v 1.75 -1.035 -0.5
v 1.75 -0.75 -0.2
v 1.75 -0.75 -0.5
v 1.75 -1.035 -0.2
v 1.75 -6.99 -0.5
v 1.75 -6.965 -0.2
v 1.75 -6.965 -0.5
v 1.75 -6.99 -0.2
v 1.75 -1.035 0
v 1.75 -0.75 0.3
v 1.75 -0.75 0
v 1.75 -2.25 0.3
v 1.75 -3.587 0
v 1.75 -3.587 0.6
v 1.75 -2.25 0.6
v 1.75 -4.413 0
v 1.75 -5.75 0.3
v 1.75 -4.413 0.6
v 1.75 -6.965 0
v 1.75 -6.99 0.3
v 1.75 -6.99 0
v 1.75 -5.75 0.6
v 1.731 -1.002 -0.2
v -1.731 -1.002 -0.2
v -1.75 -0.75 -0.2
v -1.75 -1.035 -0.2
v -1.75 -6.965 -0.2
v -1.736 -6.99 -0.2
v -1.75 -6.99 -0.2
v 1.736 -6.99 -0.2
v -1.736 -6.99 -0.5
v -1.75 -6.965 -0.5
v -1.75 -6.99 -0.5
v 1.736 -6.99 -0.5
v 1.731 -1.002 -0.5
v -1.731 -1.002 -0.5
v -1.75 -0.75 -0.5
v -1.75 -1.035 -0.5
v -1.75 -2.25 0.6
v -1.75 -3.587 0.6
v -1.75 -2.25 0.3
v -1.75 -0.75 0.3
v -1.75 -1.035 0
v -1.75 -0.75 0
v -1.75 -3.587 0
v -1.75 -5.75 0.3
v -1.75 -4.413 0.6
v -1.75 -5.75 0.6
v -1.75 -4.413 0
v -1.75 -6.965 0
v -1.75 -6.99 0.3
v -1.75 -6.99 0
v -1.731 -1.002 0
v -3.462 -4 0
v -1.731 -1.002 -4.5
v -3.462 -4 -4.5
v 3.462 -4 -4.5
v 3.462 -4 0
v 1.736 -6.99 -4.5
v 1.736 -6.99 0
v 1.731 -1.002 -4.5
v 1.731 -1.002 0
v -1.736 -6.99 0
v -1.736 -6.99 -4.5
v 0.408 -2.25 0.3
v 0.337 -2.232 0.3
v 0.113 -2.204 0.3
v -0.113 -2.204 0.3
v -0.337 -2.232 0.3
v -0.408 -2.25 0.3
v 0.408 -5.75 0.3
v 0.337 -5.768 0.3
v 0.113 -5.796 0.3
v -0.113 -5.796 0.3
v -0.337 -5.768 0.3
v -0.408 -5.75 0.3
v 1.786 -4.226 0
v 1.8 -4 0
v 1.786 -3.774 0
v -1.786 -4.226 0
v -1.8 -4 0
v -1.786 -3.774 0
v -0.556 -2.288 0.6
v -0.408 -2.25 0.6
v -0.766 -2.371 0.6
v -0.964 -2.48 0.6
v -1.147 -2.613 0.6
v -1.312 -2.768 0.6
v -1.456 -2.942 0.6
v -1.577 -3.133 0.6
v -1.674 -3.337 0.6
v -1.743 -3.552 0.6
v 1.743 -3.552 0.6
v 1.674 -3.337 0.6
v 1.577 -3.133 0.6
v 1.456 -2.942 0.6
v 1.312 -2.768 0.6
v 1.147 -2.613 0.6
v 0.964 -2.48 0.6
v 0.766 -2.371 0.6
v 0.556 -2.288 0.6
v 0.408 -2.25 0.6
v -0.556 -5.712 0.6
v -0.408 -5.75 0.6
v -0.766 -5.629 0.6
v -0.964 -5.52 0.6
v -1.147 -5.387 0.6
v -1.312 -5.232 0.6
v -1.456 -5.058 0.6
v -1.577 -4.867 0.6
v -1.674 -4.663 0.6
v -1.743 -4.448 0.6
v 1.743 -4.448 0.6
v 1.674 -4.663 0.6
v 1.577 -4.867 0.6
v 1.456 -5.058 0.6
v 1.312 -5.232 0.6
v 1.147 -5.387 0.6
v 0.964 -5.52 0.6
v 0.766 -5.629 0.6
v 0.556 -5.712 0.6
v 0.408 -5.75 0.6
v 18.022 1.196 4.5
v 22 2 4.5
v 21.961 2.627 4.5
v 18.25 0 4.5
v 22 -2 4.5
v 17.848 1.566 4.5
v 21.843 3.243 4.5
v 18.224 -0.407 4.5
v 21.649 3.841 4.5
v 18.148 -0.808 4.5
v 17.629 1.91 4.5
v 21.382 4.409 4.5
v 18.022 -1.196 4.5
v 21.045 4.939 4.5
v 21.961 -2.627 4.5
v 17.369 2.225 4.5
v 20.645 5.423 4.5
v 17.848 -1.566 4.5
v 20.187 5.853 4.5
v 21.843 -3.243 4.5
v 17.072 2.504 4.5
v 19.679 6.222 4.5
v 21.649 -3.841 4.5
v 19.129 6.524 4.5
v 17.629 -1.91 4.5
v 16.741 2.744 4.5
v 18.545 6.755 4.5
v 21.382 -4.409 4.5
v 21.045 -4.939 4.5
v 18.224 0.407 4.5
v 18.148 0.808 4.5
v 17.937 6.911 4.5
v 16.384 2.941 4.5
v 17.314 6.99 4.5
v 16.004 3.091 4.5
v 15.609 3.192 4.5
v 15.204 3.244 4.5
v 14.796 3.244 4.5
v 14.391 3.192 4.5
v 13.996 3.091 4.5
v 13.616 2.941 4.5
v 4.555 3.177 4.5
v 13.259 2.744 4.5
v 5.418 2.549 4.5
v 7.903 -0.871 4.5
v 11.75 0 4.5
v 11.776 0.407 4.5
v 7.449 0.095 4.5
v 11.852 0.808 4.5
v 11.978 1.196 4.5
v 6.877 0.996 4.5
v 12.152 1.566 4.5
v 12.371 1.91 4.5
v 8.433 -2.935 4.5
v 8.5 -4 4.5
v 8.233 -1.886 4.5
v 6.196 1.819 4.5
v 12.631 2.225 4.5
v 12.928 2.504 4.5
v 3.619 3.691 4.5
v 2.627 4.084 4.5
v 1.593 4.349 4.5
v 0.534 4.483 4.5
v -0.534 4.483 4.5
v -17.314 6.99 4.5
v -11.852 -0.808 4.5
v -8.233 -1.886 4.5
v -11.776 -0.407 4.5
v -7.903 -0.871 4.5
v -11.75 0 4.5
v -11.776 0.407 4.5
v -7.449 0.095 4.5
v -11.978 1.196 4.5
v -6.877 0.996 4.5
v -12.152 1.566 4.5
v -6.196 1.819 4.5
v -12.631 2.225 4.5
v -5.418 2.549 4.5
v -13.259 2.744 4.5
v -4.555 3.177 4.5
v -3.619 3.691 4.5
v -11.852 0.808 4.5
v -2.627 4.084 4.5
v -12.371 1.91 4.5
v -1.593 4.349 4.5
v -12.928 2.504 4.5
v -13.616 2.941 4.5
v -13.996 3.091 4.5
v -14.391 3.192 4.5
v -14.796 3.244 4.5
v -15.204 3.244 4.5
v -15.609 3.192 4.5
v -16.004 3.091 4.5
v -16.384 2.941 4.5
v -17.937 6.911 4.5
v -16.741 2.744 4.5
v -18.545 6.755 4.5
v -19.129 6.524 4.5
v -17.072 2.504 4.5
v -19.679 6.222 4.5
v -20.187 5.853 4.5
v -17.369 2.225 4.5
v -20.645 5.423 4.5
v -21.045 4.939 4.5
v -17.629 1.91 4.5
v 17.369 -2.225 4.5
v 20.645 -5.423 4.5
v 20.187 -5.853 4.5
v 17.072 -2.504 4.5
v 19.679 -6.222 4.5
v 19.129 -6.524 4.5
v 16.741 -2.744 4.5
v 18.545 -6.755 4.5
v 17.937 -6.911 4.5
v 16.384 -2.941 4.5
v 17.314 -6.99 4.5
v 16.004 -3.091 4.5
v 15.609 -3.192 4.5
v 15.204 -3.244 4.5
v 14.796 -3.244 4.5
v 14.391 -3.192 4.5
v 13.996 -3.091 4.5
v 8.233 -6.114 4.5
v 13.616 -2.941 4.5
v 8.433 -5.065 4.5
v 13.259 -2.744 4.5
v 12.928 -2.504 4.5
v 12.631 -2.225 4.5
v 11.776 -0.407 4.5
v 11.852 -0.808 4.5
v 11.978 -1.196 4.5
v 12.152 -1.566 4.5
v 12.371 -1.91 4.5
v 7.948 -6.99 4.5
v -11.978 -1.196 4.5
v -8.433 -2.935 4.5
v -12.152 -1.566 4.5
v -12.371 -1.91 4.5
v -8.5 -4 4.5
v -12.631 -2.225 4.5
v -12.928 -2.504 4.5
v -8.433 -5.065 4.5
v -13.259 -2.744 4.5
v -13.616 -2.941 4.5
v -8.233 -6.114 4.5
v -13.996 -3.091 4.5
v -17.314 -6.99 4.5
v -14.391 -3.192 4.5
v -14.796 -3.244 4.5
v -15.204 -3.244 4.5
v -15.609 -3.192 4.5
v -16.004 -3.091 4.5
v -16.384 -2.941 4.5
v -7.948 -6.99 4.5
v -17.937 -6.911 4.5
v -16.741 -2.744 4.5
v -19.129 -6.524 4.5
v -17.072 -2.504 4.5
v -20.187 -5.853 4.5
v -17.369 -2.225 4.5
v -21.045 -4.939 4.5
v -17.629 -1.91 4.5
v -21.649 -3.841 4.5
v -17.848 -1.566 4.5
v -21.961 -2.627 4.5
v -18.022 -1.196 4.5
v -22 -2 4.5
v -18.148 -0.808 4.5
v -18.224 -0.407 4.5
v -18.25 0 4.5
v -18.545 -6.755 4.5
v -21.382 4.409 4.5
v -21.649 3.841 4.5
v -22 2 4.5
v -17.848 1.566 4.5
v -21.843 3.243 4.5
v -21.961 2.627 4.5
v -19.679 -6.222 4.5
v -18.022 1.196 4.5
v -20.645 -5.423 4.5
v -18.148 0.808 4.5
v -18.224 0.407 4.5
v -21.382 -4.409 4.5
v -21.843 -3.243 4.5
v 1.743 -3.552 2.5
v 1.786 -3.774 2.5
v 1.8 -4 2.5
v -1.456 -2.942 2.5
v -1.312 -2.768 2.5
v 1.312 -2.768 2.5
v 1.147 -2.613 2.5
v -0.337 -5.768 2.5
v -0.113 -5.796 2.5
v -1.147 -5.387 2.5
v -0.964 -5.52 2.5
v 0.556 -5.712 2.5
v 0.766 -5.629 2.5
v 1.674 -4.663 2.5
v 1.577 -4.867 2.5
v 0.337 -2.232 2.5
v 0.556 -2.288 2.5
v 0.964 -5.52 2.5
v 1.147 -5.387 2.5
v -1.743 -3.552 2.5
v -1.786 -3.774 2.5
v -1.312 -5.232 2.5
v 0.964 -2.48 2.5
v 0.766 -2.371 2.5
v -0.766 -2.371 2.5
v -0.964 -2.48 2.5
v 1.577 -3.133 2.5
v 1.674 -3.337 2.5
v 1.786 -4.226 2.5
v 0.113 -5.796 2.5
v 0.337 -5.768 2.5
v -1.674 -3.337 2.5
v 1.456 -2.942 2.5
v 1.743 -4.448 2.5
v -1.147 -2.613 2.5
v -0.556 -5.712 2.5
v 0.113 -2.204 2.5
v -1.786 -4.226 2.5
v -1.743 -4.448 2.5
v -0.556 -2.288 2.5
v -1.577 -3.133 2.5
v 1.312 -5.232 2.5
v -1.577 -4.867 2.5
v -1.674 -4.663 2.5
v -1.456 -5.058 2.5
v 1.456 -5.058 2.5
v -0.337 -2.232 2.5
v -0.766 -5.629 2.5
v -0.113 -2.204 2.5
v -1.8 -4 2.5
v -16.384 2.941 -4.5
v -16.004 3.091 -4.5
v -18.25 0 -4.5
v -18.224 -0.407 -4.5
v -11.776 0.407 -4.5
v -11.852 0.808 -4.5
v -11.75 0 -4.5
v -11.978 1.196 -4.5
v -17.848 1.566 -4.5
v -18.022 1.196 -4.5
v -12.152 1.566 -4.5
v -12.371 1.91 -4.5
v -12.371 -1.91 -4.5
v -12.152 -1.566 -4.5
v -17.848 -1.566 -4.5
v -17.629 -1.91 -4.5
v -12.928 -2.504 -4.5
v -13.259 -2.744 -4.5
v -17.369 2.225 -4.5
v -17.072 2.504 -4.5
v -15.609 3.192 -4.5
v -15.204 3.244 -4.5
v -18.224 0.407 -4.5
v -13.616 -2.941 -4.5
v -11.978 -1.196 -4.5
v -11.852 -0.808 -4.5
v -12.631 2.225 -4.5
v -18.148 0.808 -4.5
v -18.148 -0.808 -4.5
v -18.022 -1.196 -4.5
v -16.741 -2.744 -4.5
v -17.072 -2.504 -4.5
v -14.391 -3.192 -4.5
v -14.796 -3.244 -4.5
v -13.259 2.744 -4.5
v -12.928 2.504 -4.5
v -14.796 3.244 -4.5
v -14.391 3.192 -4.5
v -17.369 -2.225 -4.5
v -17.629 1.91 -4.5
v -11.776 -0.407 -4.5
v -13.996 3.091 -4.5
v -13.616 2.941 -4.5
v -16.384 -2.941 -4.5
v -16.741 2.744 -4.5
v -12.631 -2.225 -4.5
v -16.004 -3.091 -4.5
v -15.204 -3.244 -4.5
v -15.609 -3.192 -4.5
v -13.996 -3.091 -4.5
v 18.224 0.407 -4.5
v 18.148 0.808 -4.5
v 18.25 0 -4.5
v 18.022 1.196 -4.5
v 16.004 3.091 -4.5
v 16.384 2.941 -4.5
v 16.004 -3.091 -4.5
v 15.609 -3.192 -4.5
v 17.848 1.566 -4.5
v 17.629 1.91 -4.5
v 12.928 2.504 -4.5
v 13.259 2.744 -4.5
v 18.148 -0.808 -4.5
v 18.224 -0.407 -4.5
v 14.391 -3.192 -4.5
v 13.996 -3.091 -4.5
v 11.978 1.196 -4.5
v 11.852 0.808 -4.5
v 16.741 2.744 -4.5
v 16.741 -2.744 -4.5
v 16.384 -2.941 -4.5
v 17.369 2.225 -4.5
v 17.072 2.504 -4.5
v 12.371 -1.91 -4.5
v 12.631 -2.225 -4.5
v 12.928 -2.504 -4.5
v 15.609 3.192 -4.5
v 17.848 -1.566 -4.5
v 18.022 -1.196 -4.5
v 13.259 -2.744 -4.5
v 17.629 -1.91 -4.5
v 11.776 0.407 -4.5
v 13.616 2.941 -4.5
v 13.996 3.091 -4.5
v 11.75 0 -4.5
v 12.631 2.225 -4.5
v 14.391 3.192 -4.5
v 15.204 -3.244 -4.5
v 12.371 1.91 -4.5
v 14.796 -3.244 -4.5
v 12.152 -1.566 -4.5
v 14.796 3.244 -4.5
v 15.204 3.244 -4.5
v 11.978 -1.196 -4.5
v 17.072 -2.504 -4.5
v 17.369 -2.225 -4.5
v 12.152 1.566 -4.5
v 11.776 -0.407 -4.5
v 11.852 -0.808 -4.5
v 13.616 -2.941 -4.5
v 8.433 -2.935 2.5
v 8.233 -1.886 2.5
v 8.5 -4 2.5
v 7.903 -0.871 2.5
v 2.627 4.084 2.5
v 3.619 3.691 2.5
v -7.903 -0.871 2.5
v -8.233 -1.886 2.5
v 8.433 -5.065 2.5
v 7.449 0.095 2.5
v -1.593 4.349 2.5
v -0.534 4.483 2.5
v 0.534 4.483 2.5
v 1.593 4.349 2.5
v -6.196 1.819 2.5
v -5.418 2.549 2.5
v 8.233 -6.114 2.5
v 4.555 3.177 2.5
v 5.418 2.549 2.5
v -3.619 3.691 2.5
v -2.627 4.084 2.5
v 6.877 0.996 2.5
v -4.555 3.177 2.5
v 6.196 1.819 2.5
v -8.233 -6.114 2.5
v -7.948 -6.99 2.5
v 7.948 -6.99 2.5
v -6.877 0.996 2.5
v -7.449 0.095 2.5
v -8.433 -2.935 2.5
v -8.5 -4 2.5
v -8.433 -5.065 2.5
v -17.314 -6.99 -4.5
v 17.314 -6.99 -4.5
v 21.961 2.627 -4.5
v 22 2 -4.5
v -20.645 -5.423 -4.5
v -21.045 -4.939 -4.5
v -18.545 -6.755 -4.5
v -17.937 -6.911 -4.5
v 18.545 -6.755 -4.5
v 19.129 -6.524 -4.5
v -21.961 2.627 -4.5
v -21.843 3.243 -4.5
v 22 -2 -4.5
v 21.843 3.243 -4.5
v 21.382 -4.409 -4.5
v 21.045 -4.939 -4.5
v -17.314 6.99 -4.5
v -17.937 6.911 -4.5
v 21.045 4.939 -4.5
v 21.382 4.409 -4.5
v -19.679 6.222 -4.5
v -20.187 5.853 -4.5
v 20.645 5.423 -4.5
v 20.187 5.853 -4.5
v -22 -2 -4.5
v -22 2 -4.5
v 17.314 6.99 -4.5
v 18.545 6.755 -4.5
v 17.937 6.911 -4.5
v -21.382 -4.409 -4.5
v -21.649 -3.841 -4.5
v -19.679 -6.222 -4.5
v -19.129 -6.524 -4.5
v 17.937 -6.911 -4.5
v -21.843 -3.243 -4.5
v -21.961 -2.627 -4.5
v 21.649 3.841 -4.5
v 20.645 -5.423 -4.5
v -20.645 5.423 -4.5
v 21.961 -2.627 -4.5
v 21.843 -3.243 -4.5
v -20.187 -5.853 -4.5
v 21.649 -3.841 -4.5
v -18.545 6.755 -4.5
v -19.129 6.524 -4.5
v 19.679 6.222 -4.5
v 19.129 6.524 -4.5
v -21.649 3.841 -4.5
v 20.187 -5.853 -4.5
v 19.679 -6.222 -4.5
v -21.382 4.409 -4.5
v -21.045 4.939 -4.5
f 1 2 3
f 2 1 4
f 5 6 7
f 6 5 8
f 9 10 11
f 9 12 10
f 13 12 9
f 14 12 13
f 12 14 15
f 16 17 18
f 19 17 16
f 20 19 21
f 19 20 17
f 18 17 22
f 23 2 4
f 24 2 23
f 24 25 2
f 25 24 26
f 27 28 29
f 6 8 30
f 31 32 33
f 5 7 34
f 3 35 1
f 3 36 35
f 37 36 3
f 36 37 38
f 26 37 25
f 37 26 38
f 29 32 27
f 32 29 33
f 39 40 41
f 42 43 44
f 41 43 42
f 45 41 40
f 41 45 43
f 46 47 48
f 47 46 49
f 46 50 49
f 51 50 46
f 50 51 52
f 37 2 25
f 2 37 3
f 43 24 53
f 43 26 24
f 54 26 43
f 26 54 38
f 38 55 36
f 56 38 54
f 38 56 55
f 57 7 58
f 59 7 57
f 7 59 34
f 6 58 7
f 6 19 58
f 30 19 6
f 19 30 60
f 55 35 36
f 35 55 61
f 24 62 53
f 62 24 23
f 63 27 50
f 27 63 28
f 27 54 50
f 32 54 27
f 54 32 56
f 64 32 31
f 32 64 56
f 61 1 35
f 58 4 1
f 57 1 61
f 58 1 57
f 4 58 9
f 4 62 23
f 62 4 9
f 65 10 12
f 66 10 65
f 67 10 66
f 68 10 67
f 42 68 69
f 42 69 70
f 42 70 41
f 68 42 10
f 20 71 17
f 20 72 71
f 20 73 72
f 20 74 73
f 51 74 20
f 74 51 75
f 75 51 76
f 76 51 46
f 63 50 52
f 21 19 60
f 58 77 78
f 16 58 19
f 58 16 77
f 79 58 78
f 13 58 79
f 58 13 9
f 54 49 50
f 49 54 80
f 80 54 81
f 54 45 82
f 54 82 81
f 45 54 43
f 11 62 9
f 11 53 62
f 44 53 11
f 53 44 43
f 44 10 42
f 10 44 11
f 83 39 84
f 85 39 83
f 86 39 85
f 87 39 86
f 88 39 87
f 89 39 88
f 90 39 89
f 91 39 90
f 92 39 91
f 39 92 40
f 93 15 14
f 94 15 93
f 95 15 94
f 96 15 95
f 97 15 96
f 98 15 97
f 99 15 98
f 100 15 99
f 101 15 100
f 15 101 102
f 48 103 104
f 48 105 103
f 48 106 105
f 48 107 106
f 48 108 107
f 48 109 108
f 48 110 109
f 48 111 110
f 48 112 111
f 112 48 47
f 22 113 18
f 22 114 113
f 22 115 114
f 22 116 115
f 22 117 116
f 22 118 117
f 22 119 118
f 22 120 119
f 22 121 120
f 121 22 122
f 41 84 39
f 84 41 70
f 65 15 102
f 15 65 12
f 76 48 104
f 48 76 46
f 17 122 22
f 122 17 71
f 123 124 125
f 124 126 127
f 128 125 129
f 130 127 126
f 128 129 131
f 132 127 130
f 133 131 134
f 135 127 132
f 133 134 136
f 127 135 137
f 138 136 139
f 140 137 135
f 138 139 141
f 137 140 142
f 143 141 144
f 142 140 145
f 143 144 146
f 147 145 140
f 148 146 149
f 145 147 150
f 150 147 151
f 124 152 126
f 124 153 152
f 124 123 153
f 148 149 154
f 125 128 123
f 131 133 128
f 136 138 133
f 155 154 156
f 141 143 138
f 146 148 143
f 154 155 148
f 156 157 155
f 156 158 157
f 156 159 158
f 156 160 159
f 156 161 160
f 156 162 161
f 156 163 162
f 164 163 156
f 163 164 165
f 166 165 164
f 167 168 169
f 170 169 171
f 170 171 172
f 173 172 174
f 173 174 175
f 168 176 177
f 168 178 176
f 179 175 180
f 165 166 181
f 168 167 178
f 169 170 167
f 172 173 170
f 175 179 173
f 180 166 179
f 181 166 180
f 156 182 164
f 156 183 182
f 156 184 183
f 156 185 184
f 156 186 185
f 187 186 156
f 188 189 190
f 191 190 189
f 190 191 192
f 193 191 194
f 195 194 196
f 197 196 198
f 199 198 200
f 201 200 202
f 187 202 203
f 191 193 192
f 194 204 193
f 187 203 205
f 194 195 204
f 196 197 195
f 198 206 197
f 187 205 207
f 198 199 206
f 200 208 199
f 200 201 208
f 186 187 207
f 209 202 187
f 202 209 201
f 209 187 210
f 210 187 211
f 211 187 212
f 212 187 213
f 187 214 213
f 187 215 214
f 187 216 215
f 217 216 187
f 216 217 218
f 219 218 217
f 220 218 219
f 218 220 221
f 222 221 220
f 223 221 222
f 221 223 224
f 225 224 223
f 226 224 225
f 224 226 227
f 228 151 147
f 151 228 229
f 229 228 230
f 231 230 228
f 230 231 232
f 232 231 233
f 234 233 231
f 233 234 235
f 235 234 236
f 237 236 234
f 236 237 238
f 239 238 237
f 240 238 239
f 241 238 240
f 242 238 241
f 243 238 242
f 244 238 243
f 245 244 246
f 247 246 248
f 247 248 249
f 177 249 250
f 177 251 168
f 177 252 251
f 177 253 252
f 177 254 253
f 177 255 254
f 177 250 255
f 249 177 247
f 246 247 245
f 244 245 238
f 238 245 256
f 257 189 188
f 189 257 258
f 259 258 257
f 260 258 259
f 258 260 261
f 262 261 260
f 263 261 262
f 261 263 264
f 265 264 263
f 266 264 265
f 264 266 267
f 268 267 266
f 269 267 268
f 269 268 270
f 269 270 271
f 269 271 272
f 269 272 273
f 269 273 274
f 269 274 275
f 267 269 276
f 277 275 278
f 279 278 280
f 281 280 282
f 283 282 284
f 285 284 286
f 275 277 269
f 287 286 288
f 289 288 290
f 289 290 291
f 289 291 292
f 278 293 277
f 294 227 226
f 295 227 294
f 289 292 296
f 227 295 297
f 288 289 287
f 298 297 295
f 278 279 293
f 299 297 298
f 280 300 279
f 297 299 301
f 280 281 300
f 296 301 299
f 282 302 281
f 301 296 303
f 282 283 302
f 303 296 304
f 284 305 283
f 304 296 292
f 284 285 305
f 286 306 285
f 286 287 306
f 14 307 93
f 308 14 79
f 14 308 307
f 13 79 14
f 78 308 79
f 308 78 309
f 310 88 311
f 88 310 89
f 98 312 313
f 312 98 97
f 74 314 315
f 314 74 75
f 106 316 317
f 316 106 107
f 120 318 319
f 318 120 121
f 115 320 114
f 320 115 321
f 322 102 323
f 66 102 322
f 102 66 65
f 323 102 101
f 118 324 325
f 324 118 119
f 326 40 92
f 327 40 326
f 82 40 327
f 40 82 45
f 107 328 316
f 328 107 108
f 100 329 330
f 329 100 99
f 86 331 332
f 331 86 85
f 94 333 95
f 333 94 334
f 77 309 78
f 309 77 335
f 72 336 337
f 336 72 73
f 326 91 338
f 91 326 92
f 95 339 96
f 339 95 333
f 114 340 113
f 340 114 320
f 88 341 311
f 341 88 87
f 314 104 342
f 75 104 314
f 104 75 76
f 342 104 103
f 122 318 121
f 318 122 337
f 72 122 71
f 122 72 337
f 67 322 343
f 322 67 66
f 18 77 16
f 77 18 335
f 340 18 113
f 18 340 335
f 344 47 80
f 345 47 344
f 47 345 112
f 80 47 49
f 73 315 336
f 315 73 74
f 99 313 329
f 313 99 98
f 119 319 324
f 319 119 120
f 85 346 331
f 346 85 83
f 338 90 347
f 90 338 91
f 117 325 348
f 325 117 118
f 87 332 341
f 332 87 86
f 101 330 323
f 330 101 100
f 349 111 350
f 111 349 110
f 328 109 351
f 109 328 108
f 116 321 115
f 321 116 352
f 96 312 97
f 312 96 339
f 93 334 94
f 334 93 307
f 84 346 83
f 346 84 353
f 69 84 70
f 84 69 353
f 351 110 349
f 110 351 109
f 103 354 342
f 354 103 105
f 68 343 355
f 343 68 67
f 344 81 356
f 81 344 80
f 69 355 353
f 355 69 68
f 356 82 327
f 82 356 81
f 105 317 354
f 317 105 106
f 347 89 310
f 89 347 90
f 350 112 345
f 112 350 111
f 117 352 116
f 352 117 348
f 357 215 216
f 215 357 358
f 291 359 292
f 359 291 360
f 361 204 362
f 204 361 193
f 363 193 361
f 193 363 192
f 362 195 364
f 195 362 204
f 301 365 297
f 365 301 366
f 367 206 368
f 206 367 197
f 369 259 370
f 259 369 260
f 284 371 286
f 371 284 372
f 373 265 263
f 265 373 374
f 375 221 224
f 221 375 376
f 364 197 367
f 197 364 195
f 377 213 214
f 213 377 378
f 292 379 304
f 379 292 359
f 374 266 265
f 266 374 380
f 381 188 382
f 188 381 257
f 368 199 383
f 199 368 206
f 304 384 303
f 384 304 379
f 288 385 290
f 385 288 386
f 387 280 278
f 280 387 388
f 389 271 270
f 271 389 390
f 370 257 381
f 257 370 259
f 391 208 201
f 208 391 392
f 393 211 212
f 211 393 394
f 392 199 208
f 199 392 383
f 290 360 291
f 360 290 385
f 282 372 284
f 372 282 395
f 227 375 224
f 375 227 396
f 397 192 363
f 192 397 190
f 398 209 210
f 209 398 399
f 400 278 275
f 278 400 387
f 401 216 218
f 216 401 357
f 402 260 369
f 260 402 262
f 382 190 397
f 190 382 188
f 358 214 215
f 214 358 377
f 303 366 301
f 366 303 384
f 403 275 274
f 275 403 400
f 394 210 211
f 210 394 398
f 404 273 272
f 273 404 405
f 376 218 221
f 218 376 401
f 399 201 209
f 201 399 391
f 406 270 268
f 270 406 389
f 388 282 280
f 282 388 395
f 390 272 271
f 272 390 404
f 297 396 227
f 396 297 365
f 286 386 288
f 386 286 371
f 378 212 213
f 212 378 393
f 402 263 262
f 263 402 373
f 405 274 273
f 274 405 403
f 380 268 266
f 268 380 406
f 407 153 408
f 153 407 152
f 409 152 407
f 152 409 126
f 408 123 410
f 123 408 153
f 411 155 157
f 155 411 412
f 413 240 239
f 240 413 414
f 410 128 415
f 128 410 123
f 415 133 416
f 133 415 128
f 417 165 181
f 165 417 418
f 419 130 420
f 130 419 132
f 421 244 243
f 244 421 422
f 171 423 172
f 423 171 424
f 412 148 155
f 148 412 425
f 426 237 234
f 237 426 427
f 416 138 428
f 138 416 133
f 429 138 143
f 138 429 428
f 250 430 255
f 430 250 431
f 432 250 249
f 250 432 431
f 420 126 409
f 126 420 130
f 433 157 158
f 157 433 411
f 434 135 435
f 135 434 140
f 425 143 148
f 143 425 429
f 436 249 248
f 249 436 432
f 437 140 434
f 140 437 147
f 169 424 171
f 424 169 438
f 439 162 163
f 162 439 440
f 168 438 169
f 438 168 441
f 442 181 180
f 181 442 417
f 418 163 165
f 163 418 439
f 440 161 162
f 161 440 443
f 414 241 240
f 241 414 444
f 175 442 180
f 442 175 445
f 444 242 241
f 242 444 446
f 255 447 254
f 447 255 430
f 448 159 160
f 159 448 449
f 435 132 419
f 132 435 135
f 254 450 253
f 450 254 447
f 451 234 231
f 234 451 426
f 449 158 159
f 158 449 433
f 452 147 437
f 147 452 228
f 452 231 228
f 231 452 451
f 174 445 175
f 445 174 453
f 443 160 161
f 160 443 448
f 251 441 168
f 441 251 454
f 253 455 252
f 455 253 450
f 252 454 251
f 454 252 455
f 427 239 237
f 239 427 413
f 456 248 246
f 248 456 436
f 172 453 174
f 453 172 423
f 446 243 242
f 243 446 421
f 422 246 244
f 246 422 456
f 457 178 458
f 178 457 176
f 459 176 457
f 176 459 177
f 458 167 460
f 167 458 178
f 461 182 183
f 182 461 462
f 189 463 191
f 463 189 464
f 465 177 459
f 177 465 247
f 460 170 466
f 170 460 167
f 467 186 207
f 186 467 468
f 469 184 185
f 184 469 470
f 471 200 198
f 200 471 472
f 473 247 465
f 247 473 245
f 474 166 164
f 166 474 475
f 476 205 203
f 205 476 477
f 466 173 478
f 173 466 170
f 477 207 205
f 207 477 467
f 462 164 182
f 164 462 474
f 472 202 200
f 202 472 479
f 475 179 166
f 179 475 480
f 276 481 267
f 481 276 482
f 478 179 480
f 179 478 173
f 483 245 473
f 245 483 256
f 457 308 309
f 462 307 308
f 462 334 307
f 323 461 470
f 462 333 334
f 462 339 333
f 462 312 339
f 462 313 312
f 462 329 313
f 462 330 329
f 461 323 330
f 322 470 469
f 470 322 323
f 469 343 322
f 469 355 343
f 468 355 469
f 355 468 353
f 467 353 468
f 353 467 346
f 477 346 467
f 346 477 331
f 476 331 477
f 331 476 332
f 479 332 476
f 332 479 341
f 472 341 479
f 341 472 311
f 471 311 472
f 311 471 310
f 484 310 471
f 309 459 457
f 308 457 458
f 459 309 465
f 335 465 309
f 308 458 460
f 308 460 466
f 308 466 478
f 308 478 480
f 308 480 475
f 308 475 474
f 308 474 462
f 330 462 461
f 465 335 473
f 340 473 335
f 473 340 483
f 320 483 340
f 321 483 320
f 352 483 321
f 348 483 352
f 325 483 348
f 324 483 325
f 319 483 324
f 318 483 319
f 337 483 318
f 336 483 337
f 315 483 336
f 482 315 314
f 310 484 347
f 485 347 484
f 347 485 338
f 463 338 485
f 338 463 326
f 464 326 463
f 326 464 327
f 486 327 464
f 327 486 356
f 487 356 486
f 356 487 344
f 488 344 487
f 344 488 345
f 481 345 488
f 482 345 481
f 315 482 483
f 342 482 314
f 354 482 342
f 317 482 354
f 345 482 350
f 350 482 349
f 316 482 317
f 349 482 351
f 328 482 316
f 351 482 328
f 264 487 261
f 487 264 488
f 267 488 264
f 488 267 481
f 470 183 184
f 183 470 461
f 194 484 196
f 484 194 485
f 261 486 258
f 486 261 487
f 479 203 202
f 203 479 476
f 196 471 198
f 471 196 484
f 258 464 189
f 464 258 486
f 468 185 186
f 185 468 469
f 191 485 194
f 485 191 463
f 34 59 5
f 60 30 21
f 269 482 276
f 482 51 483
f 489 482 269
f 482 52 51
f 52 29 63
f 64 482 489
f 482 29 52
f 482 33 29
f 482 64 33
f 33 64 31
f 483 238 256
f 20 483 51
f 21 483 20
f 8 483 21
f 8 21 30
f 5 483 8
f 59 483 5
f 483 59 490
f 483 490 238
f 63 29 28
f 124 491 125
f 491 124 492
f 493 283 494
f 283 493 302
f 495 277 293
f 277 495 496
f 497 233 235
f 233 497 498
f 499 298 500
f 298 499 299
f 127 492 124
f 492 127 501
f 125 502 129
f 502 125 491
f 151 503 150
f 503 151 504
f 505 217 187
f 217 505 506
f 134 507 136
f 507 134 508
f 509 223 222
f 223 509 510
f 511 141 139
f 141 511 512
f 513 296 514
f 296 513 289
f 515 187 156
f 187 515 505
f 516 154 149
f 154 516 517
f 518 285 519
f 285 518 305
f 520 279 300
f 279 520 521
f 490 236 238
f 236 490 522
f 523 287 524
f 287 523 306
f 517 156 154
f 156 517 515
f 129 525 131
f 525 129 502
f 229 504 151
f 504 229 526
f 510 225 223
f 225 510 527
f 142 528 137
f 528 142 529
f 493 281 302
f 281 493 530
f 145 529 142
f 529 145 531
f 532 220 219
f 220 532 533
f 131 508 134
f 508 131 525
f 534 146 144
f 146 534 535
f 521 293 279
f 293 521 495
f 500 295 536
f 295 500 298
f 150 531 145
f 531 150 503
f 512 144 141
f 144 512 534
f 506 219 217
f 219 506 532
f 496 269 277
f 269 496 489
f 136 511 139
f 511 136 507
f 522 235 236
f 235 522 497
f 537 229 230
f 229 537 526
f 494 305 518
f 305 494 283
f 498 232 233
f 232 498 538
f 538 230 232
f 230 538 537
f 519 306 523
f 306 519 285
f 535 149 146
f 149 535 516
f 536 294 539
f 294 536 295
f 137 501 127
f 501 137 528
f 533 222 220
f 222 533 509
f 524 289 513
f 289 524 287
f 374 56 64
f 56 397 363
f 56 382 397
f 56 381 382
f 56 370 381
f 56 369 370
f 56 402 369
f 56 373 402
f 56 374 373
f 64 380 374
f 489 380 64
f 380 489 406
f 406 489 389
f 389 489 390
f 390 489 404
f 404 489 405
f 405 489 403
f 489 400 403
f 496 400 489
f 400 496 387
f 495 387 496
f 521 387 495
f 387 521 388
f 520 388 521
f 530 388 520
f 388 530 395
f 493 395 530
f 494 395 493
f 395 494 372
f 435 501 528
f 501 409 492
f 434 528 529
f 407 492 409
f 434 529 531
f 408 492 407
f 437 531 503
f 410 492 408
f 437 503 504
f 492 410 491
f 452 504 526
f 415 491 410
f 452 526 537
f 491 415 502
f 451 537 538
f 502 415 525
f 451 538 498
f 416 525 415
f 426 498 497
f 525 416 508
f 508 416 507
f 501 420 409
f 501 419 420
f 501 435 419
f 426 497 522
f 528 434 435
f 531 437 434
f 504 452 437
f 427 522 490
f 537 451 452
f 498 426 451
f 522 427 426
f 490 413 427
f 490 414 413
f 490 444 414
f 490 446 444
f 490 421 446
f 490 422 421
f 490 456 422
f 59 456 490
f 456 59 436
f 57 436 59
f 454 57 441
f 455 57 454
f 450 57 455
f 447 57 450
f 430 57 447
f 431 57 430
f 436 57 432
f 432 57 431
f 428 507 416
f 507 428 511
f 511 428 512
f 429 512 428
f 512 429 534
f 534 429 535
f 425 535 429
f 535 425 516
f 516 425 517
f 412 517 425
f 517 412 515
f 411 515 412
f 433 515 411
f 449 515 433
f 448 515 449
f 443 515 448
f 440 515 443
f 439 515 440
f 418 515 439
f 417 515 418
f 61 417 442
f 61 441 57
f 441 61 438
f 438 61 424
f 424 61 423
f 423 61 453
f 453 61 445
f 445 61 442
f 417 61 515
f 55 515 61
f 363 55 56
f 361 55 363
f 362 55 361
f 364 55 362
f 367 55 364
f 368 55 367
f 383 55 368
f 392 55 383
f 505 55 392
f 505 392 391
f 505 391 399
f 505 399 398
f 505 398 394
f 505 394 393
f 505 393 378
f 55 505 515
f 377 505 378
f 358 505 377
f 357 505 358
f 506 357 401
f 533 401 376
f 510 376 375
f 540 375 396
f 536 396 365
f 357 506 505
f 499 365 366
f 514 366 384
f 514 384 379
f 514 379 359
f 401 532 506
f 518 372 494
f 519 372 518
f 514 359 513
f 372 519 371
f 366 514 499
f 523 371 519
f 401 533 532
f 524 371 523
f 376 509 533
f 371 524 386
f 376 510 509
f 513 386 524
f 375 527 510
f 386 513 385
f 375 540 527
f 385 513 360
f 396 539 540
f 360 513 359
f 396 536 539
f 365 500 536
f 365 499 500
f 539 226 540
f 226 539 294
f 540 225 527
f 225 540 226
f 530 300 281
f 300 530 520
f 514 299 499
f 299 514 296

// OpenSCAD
$fn = 50;


difference() {
	union() {
		translate(v = [0, 0, -4.5000000000]) {
			hull() {
				translate(v = [-17.0000000000, 2.0000000000, 0]) {
					cylinder(h = 9, r = 5);
				}
				translate(v = [17.0000000000, 2.0000000000, 0]) {
					cylinder(h = 9, r = 5);
				}
				translate(v = [-17.0000000000, -2.0000000000, 0]) {
					cylinder(h = 9, r = 5);
				}
				translate(v = [17.0000000000, -2.0000000000, 0]) {
					cylinder(h = 9, r = 5);
				}
			}
		}
	}
	union() {
		translate(v = [0, -4, 4.5000000000]) {
			rotate(a = [0, 0, 0]) {
				difference() {
					union() {
						translate(v = [0, 0, -5.0000000000]) {
							rotate(a = [0, 0, 0]) {
								difference() {
									union() {
										translate(v = [-1.7500000000, -3.2500000000, -250.3000000000]) {
											cube(size = [3.5000000000, 6.5000000000, 0.3000000000]);
										}
										translate(v = [-1.7500000000, -1.7500000000, -250.6000000000]) {
											cube(size = [3.5000000000, 3.5000000000, 0.3000000000]);
										}
										translate(v = [-1.7500000000, -3.2500000000, 0]) {
											cube(size = [3.5000000000, 6.5000000000, 0.3000000000]);
										}
										translate(v = [-1.7500000000, -1.7500000000, 0.3000000000]) {
											cube(size = [3.5000000000, 3.5000000000, 0.3000000000]);
										}
										translate(v = [0, 0, -250]) {
											linear_extrude(height = 250) {
												polygon(points = [[3.4620000000, 0.0000000000], [1.7310000000, 2.9981799479], [-1.7310000000, 2.9981799479], [-3.4620000000, 0.0000000000], [-1.7310000000, -2.9981799479], [1.7310000000, -2.9981799479]]);
											}
										}
										translate(v = [-1.7500000000, -3.2500000000, -250.3000000000]) {
											cube(size = [3.5000000000, 6.5000000000, 0.3000000000]);
										}
										translate(v = [-1.7500000000, -1.7500000000, -250.6000000000]) {
											cube(size = [3.5000000000, 3.5000000000, 0.3000000000]);
										}
										translate(v = [-1.7500000000, -3.2500000000, 0]) {
											cube(size = [3.5000000000, 6.5000000000, 0.3000000000]);
										}
										translate(v = [-1.7500000000, -1.7500000000, 0.3000000000]) {
											cube(size = [3.5000000000, 3.5000000000, 0.3000000000]);
										}
										translate(v = [-1.7500000000, -3.2500000000, -250.3000000000]) {
											cube(size = [3.5000000000, 6.5000000000, 0.3000000000]);
										}
										translate(v = [-1.7500000000, -1.7500000000, -250.6000000000]) {
											cube(size = [3.5000000000, 3.5000000000, 0.3000000000]);
										}
										translate(v = [-1.7500000000, -3.2500000000, 0]) {
											cube(size = [3.5000000000, 6.5000000000, 0.3000000000]);
										}
										translate(v = [-1.7500000000, -1.7500000000, 0.3000000000]) {
											cube(size = [3.5000000000, 3.5000000000, 0.3000000000]);
										}
									}
									union();
								}
							}
						}
						translate(v = [0, 0, -4.5000000000]) {
							rotate(a = [0, 0, 0]) {
								difference() {
									union() {
										translate(v = [-1.7500000000, -3.2500000000, -250.3000000000]) {
											cube(size = [3.5000000000, 6.5000000000, 0.3000000000]);
										}
										translate(v = [-1.7500000000, -1.7500000000, -250.6000000000]) {
											cube(size = [3.5000000000, 3.5000000000, 0.3000000000]);
										}
										translate(v = [-1.7500000000, -3.2500000000, 0]) {
											cube(size = [3.5000000000, 6.5000000000, 0.3000000000]);
										}
										translate(v = [-1.7500000000, -1.7500000000, 0.3000000000]) {
											cube(size = [3.5000000000, 3.5000000000, 0.3000000000]);
										}
										translate(v = [0, 0, -250]) {
											linear_extrude(height = 250) {
												polygon(points = [[3.4620000000, 0.0000000000], [1.7310000000, 2.9981799479], [-1.7310000000, 2.9981799479], [-3.4620000000, 0.0000000000], [-1.7310000000, -2.9981799479], [1.7310000000, -2.9981799479]]);
											}
										}
										translate(v = [-1.7500000000, -3.2500000000, -250.3000000000]) {
											cube(size = [3.5000000000, 6.5000000000, 0.3000000000]);
										}
										translate(v = [-1.7500000000, -1.7500000000, -250.6000000000]) {
											cube(size = [3.5000000000, 3.5000000000, 0.3000000000]);
										}
										translate(v = [-1.7500000000, -3.2500000000, 0]) {
											cube(size = [3.5000000000, 6.5000000000, 0.3000000000]);
										}
										translate(v = [-1.7500000000, -1.7500000000, 0.3000000000]) {
											cube(size = [3.5000000000, 3.5000000000, 0.3000000000]);
										}
										translate(v = [-1.7500000000, -3.2500000000, -250.3000000000]) {
											cube(size = [3.5000000000, 6.5000000000, 0.3000000000]);
										}
										translate(v = [-1.7500000000, -1.7500000000, -250.6000000000]) {
											cube(size = [3.5000000000, 3.5000000000, 0.3000000000]);
										}
										translate(v = [-1.7500000000, -3.2500000000, 0]) {
											cube(size = [3.5000000000, 6.5000000000, 0.3000000000]);
										}
										translate(v = [-1.7500000000, -1.7500000000, 0.3000000000]) {
											cube(size = [3.5000000000, 3.5000000000, 0.3000000000]);
										}
									}
									union();
								}
							}
						}
						translate(v = [0, 0, -5.0000000000]) {
							rotate(a = [0, 0, 0]) {
								difference() {
									union() {
										translate(v = [-1.7500000000, -3.2500000000, -250.3000000000]) {
											cube(size = [3.5000000000, 6.5000000000, 0.3000000000]);
										}
										translate(v = [-1.7500000000, -1.7500000000, -250.6000000000]) {
											cube(size = [3.5000000000, 3.5000000000, 0.3000000000]);
										}
										translate(v = [-1.7500000000, -3.2500000000, 0]) {
											cube(size = [3.5000000000, 6.5000000000, 0.3000000000]);
										}
										translate(v = [-1.7500000000, -1.7500000000, 0.3000000000]) {
											cube(size = [3.5000000000, 3.5000000000, 0.3000000000]);
										}
										translate(v = [0, 0, -250]) {
											linear_extrude(height = 250) {
												polygon(points = [[3.4620000000, 0.0000000000], [1.7310000000, 2.9981799479], [-1.7310000000, 2.9981799479], [-3.4620000000, 0.0000000000], [-1.7310000000, -2.9981799479], [1.7310000000, -2.9981799479]]);
											}
										}
										translate(v = [-1.7500000000, -3.2500000000, -250.3000000000]) {
											cube(size = [3.5000000000, 6.5000000000, 0.3000000000]);
										}
										translate(v = [-1.7500000000, -1.7500000000, -250.6000000000]) {
											cube(size = [3.5000000000, 3.5000000000, 0.3000000000]);
										}
										translate(v = [-1.7500000000, -3.2500000000, 0]) {
											cube(size = [3.5000000000, 6.5000000000, 0.3000000000]);
										}
										translate(v = [-1.7500000000, -1.7500000000, 0.3000000000]) {
											cube(size = [3.5000000000, 3.5000000000, 0.3000000000]);
										}
										translate(v = [-1.7500000000, -3.2500000000, -250.3000000000]) {
											cube(size = [3.5000000000, 6.5000000000, 0.3000000000]);
										}
										translate(v = [-1.7500000000, -1.7500000000, -250.6000000000]) {
											cube(size = [3.5000000000, 3.5000000000, 0.3000000000]);
										}
										translate(v = [-1.7500000000, -3.2500000000, 0]) {
											cube(size = [3.5000000000, 6.5000000000, 0.3000000000]);
										}
										translate(v = [-1.7500000000, -1.7500000000, 0.3000000000]) {
											cube(size = [3.5000000000, 3.5000000000, 0.3000000000]);
										}
									}
									union();
								}
							}
						}
						translate(v = [0, 0, -7.5000000000]) {
							cylinder(h = 7.5000000000, r = 1.5000000000);
						}
						translate(v = [0, 0, -1.9000000000]) {
							cylinder(h = 1.9000000000, r1 = 1.8000000000, r2 = 3.6000000000);
						}
						translate(v = [0, 0, -7.5000000000]) {
							cylinder(h = 7.5000000000, r = 1.8000000000);
						}
						translate(v = [0, 0, -7.5000000000]) {
							cylinder(h = 7.5000000000, r = 1.5000000000);
						}
					}
					union();
				}
			}
		}
		translate(v = [-15.0000000000, 0.0000000000, -100.0000000000]) {
			cylinder(h = 200, r = 3.2500000000);
		}
		translate(v = [15.0000000000, 0.0000000000, -100.0000000000]) {
			cylinder(h = 200, r = 3.2500000000);
		}
		translate(v = [15.0000000000, 0.0000000000, -100.0000000000]) {
			cylinder(h = 200, r = 3.2500000000);
		}
		translate(v = [-15.0000000000, 0.0000000000, -100.0000000000]) {
			cylinder(h = 200, r = 1.8000000000);
		}
		translate(v = [15.0000000000, 0.0000000000, -100.0000000000]) {
			cylinder(h = 200, r = 1.8000000000);
		}
		translate(v = [-15.0000000000, 0.0000000000, -100.0000000000]) {
			cylinder(h = 200, r = 1.8000000000);
		}
		translate(v = [15.0000000000, 0.0000000000, -100.0000000000]) {
			cylinder(h = 200, r = 1.8000000000);
		}
		translate(v = [-15.0000000000, 0.0000000000, -100.0000000000]) {
			cylinder(h = 200, r = 1.8000000000);
		}
		translate(v = [15.0000000000, 0.0000000000, -100.0000000000]) {
			cylinder(h = 200, r = 1.8000000000);
		}
		translate(v = [0, -4, 2.5000000000]) {
			cylinder(h = 2, r = 8.5000000000);
		}
	}
}
